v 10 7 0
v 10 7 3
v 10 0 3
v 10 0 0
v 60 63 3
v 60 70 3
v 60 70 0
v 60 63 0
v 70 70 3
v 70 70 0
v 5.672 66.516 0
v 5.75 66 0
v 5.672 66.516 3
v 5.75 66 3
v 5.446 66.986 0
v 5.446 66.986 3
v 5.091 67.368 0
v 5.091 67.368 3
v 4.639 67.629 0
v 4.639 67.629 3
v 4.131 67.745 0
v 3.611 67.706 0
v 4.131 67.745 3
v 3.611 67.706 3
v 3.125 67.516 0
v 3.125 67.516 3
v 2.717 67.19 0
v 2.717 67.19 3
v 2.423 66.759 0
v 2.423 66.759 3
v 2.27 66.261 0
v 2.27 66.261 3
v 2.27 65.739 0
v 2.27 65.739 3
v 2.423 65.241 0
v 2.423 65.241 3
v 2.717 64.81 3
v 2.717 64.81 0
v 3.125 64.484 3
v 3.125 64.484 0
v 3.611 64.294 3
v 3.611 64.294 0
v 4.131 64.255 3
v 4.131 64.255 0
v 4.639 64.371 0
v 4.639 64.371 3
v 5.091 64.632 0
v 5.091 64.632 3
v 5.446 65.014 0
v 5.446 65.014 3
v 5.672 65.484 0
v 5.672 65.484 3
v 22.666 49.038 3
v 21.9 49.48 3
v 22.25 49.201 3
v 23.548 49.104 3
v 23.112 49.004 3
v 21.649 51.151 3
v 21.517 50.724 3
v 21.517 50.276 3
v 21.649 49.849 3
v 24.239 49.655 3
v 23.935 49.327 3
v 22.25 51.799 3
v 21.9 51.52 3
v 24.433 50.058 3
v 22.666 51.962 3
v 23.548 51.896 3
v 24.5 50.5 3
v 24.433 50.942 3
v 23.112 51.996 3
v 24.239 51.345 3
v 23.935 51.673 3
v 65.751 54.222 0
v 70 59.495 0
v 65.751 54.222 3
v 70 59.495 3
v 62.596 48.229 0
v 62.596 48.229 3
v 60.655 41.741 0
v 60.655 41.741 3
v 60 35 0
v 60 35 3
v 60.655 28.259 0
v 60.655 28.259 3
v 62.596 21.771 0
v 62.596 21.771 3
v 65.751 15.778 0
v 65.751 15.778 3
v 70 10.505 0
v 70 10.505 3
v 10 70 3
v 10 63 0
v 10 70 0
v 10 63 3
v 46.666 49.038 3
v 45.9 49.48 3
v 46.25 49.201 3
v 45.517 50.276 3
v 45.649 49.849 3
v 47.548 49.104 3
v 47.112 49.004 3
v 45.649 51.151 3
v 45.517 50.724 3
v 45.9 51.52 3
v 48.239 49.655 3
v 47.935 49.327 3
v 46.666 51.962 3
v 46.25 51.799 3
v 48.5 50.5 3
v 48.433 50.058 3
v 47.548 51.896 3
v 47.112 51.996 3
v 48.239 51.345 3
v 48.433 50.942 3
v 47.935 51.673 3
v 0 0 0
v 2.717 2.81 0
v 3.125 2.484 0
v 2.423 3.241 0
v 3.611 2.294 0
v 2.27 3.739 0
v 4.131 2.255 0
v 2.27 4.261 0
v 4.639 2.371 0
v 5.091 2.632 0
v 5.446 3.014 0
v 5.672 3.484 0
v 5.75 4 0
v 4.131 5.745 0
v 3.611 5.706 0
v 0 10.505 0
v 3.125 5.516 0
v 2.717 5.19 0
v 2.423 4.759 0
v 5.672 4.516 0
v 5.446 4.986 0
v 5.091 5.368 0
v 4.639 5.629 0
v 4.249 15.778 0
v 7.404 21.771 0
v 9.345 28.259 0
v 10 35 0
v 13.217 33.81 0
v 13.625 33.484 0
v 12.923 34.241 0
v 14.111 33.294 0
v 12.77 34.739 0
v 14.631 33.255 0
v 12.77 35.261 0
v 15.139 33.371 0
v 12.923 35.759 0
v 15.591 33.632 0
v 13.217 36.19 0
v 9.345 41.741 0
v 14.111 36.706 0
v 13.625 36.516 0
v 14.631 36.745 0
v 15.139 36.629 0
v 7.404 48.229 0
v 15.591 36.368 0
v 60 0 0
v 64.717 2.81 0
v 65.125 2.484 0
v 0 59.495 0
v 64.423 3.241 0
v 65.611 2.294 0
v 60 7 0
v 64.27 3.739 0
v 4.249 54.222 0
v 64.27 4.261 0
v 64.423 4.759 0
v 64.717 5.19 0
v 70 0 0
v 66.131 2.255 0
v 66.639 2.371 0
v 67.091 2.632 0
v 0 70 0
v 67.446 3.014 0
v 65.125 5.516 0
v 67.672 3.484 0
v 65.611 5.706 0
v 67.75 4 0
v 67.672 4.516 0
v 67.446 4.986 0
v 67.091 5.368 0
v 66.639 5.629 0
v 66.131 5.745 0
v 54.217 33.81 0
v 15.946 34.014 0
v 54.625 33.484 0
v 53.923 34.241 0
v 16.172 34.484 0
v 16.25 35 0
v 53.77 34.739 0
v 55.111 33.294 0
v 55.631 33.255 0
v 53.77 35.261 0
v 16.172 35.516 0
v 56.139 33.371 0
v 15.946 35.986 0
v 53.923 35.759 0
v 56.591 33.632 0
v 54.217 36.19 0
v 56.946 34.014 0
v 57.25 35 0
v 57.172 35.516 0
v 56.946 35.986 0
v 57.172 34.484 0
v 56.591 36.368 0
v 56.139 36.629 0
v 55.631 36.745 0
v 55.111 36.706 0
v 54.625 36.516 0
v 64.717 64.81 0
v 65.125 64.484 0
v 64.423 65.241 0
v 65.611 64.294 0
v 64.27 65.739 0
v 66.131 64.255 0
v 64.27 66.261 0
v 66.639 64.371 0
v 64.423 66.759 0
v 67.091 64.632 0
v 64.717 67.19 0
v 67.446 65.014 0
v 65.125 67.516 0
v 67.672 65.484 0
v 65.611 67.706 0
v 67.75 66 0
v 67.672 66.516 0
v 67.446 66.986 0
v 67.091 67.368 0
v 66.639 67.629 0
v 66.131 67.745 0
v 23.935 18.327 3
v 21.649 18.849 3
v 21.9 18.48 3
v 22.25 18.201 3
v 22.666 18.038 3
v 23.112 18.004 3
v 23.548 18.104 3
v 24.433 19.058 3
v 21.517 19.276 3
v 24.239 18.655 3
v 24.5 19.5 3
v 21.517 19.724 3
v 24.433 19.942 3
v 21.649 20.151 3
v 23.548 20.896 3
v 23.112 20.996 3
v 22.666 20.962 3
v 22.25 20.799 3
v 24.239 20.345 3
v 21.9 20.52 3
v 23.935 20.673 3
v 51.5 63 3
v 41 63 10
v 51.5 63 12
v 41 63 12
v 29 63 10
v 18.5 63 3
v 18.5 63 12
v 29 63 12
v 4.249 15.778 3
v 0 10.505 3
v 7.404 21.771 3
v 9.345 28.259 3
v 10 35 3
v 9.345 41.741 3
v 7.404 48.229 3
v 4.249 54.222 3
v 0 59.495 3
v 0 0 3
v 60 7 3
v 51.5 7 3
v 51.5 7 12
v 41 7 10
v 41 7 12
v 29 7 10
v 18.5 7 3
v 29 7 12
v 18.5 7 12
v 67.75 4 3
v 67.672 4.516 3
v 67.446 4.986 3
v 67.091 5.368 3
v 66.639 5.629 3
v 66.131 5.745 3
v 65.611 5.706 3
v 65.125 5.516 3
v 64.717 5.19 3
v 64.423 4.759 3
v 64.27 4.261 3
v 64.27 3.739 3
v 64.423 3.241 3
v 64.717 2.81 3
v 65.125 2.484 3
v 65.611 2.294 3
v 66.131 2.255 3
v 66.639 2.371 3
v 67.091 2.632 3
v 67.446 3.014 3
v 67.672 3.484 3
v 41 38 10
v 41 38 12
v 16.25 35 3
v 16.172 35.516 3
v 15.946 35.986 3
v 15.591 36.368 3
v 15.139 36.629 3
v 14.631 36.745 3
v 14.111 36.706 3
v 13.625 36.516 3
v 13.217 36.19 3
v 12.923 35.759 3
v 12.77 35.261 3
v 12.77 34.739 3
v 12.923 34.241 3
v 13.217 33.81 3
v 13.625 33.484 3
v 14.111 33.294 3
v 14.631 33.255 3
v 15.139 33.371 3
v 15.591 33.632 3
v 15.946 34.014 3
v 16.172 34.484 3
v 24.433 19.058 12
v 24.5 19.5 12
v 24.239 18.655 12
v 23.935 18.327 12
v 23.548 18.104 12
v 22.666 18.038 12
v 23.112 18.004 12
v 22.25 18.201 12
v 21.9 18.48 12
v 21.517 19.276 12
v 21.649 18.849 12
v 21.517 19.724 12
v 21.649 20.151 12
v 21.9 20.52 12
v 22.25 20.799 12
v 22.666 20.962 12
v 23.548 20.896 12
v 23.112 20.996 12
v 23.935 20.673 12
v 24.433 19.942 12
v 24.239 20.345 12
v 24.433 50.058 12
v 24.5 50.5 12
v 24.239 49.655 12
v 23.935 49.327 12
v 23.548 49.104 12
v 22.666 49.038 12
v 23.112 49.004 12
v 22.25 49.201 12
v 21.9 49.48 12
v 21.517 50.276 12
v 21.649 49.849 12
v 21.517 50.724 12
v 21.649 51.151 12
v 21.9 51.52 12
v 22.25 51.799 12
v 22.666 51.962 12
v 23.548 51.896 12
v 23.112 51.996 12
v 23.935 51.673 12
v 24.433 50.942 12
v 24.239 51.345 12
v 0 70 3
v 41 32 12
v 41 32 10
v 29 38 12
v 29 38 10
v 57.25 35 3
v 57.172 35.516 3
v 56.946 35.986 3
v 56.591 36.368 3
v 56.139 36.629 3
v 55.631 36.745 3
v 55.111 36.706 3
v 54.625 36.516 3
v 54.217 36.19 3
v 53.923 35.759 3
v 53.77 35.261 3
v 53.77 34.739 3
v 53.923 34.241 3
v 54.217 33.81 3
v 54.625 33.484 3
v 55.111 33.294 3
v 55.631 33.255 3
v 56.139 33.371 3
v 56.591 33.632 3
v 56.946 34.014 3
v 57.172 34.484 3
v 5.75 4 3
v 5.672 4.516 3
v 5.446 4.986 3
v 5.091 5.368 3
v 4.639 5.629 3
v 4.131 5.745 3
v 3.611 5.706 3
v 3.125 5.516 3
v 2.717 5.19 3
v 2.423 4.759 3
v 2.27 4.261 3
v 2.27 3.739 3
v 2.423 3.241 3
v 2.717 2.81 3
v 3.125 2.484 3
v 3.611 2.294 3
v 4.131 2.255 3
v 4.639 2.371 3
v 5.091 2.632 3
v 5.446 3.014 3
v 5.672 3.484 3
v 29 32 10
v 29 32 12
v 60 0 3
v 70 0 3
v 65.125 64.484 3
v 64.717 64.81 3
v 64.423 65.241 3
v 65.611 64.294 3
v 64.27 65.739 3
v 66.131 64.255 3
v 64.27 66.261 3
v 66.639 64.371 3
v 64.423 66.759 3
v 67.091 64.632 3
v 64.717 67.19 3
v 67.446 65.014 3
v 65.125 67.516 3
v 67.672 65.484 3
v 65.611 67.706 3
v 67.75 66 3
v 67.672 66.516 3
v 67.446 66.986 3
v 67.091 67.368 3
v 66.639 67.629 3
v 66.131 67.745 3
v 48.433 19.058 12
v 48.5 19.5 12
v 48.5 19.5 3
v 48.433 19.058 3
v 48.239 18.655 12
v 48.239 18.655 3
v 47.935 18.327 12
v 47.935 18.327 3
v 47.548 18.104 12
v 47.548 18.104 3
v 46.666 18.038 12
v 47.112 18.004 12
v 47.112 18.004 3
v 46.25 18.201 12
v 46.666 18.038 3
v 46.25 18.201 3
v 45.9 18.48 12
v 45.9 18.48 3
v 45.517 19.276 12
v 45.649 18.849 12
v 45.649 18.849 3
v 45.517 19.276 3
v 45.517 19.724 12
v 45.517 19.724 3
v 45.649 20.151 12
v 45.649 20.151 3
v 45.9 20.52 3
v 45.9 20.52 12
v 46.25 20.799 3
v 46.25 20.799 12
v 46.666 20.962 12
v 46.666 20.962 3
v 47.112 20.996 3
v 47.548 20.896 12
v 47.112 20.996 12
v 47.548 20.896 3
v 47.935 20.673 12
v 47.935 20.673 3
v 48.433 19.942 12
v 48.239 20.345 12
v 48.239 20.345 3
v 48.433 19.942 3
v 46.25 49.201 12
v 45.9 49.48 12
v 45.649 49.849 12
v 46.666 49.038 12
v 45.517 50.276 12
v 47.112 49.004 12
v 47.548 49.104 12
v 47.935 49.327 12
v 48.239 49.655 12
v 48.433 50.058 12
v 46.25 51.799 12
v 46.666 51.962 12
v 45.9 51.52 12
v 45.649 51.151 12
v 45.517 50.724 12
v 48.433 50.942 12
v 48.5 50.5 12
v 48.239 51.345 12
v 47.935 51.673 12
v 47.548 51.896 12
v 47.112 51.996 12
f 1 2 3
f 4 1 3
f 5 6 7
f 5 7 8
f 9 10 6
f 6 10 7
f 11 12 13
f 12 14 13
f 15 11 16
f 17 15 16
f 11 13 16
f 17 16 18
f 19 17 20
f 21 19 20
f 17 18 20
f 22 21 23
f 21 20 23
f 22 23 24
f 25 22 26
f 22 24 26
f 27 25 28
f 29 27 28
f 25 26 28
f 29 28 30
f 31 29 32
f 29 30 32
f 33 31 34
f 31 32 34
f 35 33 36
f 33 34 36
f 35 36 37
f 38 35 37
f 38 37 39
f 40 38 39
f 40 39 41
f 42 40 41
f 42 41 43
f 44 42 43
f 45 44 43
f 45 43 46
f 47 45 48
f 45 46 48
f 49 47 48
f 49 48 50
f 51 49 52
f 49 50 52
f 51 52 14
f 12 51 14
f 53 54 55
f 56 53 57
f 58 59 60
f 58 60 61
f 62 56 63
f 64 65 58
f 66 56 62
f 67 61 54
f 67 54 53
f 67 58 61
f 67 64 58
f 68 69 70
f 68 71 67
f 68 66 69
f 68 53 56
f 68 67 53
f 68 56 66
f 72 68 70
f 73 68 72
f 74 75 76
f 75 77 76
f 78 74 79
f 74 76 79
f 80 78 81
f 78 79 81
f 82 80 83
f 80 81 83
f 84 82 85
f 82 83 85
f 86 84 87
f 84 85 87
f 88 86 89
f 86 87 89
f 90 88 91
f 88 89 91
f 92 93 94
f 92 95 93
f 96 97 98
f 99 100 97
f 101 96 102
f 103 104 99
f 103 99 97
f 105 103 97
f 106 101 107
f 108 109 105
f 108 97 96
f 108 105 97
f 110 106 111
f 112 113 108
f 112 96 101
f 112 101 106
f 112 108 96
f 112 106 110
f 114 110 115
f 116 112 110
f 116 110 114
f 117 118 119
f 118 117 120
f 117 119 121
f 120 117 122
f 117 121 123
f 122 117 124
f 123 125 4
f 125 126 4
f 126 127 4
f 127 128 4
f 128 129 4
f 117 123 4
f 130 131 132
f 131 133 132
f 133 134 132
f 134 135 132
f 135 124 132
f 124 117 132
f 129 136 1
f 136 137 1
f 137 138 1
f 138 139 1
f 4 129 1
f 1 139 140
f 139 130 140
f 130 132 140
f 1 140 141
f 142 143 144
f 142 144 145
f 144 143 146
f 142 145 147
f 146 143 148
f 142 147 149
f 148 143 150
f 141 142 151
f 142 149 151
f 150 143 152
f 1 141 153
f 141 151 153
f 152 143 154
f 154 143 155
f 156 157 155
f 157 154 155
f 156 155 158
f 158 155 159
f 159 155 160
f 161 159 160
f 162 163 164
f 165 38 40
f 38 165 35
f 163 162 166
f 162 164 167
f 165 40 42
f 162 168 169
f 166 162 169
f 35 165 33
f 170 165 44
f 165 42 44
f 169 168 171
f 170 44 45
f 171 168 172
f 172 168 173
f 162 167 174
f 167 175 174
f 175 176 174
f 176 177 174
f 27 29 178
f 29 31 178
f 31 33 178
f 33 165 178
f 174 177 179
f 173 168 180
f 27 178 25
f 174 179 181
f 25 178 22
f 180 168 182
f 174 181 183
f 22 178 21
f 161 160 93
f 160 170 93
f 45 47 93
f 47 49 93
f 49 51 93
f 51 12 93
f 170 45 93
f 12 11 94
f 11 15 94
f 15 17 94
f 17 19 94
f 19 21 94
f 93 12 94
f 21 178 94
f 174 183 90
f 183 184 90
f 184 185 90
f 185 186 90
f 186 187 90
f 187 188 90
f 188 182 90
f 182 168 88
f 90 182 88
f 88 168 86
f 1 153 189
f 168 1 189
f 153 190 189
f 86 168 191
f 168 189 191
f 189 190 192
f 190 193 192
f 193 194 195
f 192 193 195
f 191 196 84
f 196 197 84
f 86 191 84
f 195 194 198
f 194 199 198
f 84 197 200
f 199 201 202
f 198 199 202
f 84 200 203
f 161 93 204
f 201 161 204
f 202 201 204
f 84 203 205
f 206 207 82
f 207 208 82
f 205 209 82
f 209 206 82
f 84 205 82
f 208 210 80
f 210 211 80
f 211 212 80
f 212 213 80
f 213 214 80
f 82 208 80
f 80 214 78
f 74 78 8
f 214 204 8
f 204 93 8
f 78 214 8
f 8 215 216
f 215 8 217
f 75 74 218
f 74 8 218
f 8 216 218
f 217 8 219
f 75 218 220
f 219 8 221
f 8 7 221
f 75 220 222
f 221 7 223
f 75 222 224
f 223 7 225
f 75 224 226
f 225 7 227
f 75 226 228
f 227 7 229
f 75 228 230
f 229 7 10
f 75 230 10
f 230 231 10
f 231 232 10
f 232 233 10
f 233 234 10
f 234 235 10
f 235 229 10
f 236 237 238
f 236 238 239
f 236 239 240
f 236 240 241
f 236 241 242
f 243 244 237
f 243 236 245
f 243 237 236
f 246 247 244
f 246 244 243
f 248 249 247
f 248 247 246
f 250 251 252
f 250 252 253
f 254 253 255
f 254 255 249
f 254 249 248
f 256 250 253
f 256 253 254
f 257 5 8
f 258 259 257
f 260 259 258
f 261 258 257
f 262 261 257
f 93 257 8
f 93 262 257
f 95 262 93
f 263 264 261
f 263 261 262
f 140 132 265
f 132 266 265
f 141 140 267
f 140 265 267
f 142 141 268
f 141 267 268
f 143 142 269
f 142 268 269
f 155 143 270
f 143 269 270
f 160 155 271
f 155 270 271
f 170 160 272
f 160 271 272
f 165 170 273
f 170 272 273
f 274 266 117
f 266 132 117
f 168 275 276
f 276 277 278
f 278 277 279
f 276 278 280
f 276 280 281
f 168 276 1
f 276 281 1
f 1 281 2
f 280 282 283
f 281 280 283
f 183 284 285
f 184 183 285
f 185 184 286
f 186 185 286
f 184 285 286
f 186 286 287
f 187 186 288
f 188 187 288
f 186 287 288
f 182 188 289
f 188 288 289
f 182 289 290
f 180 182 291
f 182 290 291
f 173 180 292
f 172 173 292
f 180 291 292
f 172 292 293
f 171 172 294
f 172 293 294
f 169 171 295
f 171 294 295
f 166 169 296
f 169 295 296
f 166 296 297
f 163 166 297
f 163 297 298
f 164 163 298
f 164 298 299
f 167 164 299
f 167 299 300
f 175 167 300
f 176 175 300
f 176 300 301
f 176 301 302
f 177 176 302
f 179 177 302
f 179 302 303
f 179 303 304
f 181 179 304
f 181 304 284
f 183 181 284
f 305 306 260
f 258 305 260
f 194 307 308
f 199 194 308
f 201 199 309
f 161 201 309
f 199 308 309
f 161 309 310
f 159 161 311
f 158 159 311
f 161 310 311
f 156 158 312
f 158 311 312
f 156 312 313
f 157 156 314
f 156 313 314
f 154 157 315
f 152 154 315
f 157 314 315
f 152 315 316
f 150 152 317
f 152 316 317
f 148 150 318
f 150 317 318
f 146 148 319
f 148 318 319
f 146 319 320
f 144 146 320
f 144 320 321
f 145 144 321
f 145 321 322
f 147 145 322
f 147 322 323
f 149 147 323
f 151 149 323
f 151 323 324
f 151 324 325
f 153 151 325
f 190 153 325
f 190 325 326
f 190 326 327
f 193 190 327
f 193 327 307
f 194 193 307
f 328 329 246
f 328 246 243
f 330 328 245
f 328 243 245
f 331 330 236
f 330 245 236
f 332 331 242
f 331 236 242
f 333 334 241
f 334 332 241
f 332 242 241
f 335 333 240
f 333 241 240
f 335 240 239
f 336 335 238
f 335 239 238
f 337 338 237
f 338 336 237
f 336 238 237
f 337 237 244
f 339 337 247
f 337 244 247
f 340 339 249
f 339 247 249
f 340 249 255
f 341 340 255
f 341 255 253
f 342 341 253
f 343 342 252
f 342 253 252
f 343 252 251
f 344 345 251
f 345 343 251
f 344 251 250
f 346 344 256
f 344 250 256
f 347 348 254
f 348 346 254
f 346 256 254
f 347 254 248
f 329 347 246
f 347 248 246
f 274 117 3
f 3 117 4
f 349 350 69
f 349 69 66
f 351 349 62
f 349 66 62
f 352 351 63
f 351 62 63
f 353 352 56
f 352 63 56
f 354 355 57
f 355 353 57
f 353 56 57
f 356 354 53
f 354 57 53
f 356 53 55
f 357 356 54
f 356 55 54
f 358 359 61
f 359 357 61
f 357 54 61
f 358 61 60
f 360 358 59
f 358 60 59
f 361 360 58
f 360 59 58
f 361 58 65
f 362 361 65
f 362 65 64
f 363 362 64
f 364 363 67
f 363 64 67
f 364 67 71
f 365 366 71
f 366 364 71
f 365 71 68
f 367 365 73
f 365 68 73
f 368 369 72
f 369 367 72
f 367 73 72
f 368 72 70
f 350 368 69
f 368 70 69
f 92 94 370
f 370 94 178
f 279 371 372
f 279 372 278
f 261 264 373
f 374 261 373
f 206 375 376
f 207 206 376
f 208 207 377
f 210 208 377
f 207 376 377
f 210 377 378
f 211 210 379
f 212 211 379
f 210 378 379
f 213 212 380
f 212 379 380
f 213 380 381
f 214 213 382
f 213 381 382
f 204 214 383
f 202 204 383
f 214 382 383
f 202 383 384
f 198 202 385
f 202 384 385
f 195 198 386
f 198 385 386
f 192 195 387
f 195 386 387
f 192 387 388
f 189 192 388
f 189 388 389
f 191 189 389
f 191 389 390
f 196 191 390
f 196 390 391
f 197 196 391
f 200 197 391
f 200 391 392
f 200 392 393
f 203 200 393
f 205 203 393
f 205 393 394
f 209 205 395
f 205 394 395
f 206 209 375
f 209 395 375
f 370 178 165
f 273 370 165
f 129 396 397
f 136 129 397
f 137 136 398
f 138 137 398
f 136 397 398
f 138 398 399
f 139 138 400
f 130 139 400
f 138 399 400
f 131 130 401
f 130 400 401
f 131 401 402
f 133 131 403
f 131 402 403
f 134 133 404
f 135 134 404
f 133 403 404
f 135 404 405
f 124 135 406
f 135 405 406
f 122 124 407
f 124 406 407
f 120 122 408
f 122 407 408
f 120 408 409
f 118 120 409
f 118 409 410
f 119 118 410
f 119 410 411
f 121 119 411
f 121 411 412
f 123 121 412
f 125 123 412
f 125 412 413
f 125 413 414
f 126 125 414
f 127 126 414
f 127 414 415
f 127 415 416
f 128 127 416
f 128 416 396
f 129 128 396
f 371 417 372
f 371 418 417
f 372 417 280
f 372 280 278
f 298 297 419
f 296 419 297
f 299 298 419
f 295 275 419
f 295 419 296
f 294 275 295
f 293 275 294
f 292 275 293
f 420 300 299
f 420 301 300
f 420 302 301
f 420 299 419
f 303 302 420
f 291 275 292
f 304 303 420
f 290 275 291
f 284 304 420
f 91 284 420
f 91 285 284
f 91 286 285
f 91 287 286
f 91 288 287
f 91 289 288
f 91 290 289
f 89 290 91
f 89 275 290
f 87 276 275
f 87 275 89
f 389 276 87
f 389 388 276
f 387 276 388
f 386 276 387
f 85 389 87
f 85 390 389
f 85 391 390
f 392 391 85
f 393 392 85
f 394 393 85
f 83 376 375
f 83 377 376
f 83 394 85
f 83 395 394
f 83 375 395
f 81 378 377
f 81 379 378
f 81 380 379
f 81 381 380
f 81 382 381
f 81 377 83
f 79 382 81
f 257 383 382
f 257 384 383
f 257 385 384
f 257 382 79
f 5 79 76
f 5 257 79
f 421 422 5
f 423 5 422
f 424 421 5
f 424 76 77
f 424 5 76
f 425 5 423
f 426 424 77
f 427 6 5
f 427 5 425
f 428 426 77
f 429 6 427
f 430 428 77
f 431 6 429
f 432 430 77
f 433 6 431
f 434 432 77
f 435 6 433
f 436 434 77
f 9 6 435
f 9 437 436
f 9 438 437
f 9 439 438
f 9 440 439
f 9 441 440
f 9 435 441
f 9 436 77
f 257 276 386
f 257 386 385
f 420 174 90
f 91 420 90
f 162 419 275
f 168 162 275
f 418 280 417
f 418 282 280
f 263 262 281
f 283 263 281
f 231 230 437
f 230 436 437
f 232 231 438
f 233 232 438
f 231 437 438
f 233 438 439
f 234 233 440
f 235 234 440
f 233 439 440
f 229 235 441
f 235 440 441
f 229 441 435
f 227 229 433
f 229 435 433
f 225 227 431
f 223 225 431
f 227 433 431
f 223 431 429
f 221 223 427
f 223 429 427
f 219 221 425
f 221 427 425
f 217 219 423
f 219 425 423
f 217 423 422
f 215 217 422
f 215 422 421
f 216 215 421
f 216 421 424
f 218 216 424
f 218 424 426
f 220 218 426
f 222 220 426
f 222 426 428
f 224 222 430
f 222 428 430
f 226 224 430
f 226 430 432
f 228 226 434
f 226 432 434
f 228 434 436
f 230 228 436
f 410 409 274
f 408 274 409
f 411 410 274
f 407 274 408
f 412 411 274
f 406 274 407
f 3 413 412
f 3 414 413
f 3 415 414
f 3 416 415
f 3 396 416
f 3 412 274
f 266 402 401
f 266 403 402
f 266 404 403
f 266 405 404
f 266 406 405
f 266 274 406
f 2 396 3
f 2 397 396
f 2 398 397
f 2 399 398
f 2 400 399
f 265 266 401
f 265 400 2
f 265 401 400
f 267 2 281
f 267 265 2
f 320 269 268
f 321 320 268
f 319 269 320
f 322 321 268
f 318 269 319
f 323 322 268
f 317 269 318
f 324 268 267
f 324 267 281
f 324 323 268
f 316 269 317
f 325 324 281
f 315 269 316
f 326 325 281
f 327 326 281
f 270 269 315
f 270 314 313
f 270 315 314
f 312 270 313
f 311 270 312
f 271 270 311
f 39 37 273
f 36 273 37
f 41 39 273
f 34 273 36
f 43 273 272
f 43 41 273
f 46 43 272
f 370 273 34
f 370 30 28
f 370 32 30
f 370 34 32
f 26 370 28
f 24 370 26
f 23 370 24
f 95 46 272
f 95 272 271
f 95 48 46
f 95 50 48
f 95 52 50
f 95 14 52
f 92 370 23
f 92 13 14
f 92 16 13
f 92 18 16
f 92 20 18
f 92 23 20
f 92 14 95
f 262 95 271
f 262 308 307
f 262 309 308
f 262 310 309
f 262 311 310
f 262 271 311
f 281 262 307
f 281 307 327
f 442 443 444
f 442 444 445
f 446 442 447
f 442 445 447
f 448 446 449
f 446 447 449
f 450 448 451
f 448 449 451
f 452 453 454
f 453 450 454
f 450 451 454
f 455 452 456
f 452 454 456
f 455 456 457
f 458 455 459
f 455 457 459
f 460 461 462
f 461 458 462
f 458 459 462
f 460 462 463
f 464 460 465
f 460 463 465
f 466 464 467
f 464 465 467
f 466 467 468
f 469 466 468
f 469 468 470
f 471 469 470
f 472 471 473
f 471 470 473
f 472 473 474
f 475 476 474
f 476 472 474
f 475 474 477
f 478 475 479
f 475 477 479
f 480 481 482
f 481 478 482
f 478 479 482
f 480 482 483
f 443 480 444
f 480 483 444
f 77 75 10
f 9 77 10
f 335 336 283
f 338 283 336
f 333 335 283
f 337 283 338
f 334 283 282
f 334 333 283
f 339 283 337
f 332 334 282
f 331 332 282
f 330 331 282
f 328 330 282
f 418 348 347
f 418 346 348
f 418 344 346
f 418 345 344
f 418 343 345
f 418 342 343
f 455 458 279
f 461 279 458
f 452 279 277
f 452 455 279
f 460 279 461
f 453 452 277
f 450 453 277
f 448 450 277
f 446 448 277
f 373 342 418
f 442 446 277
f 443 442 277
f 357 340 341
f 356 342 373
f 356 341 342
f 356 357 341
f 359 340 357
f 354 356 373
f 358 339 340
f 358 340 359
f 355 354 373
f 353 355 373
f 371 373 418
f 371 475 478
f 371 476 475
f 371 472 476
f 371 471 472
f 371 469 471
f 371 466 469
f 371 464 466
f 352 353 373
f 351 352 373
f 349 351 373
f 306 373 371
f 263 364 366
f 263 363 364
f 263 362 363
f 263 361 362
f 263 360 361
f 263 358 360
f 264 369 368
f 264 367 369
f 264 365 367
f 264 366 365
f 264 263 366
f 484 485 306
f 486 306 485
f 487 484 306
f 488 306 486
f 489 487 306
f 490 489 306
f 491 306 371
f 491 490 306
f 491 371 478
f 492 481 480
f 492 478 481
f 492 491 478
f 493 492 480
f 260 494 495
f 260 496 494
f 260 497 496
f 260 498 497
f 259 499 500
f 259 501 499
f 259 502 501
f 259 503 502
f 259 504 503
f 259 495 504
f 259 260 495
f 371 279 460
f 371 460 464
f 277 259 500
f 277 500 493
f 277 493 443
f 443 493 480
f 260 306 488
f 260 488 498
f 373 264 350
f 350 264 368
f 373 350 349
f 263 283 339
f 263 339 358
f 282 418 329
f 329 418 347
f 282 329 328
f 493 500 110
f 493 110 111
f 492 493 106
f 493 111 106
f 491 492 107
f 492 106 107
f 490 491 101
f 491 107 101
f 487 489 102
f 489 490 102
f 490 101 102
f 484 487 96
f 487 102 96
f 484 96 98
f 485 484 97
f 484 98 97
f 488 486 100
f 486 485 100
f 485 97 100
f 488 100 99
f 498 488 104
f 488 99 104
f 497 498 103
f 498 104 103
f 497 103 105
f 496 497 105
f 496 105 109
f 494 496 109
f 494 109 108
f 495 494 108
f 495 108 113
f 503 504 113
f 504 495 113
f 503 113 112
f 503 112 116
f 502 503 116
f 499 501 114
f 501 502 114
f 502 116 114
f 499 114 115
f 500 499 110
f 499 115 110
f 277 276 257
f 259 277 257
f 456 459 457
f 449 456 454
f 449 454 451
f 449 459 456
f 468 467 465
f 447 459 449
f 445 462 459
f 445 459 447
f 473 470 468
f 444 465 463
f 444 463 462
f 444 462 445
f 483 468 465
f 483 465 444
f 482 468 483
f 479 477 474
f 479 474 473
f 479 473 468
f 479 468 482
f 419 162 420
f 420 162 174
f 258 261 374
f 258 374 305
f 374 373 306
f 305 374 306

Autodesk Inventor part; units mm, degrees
ref_plane "YZ Plane" through (0, 0, 0) normal (1, 0, 0) x (0, 1, 0)
ref_plane "XZ Plane" through (0, 0, 0) normal (0, 1, 0) x (-1, 0, 0)
ref_plane "XY Plane" through (0, 0, 0) normal (0, 0, 1) x (1, 0, 0)
sketch "Sketch1" plane through (0, 0, 0) normal (0, 0, 1) x (1, 0, 0)
  line L0 (0, 0) -> (70, 0)
  line L1 (70, 0) -> (70, 70)
  line L2 (70, 70) -> (0, 70)
  line L3 (0, 70) -> (0, 0)
  dimension "d0" = 70
  dimension "d1" = 70
extrude "Extrusion1" add sketch "Sketch1" along normal blind 3
sketch "Esboço3" plane through (0, 0, 3) normal (0, 0, 1) x (1, 0, 0)
  line L0 (70, 70) -> (0, 70) projected
  line L1 (70, 0) -> (70, 70) projected
  line L2 (0, 70) -> (0, 0) projected
  line L3 (41, 63) -> (29, 63)
  line L4 (29, 63) -> (29, 38)
  line L5 (29, 38) -> (41, 38)
  line L6 (41, 38) -> (41, 63)
  line L7 (41, 7) -> (29, 7)
  line L8 (29, 7) -> (29, 32)
  line L9 (29, 32) -> (41, 32)
  line L10 (41, 32) -> (41, 7)
  line L11 (0, 0) -> (70, 0) projected
  circle A0 centre (23, 19.5) radius 1.5
  circle A1 centre (23, 19.5) radius 4.5
  circle A2 centre (47, 19.5) radius 1.5
  circle A3 centre (47, 19.5) radius 4.5
  circle A4 centre (23, 50.5) radius 4.5
  circle A5 centre (23, 50.5) radius 1.5
  circle A6 centre (47, 50.5) radius 1.5
  circle A7 centre (47, 50.5) radius 4.5
  line L12 (18.5, 7) -> (51.5, 7)
  line L13 (51.5, 7) -> (51.5, 63)
  line L14 (51.5, 63) -> (18.5, 63)
  line L15 (18.5, 63) -> (18.5, 7)
  point P0 (35, 70)
  point P1 (35, 63)
  point P2 (35, 7)
  point P3 (29, 50.5)
  point P4 (35, 32)
  point P5 (18.5, 50.5)
  point P6 (18.5, 19.5)
  point P7 (51.5, 19.5)
  point P8 (51.5, 50.5)
  dimension "d10" = 70
  dimension "d11" = 12
  dimension "d12" = 25
  dimension "d13" = 7
  dimension "d14" = 35
  dimension "d15" = 12
  dimension "d16" = 25
  dimension "d17" = 7
  dimension "d18" = 35
  dimension "d21" = 3
  dimension "d22" = 12.5
  dimension "d24" = 9
  dimension "d25" = 6
  dimension "d26" = 3
  dimension "d27" = 9
  dimension "d28" = 6
  dimension "d29" = 12.5
  dimension "d30" = 9
  dimension "d31" = 6
  dimension "d32" = 3
  dimension "d33" = 12.5
  dimension "d34" = 3
  dimension "d35" = 9
  dimension "d36" = 12.5
  dimension "d37" = 6
  dimension "d40" = 56
  dimension "d41" = 16.5
  dimension "d42" = 16.5
extrude "Extrusão4" add sketch "Esboço3" along normal blind 9 contours L6 L5 L4 L3 | A4 | A1 | A3 | A7 | L14 L13 L12 L10 L9 L8 L15 L4 L5 L6 | L7 L8 L9 L10
sketch "Esboço4" plane through (0, 0, 12) normal (0, 0, 1) x (1, 0, 0)
  line L0 (70, 70) -> (0, 70)
  line L1 (70, 0) -> (70, 70)
  line L2 (0, 70) -> (0, 0)
  line L3 (41, 63) -> (29, 63)
  line L4 (29, 63) -> (29, 38)
  line L5 (29, 38) -> (41, 38)
  line L6 (41, 38) -> (41, 63)
  line L7 (41, 7) -> (29, 7)
  line L8 (29, 7) -> (29, 32)
  line L9 (29, 32) -> (41, 32)
  line L10 (41, 32) -> (41, 7)
  line L11 (0, 0) -> (70, 0)
  circle A0 centre (23, 19.5) radius 1.5
  circle A1 centre (23, 19.5) radius 4.5
  circle A2 centre (47, 19.5) radius 1.5
  circle A3 centre (47, 19.5) radius 4.5
  circle A4 centre (23, 50.5) radius 4.5
  circle A5 centre (23, 50.5) radius 1.5
  circle A6 centre (47, 50.5) radius 1.5
  circle A7 centre (47, 50.5) radius 4.5
  line L12 (18.5, 7) -> (51.5, 7)
  line L13 (51.5, 7) -> (51.5, 63)
  line L14 (51.5, 63) -> (18.5, 63)
  line L15 (18.5, 63) -> (18.5, 7)
  point P0 (35, 70)
  point P1 (35, 63)
  point P2 (35, 7)
  point P3 (29, 50.5)
  point P4 (35, 32)
  point P5 (18.5, 50.5)
  point P6 (18.5, 19.5)
  point P7 (51.5, 19.5)
  point P8 (51.5, 50.5)
  dimension "d43" = 70
  dimension "d44" = 12
  dimension "d45" = 25
  dimension "d46" = 7
  dimension "d47" = 35
  dimension "d48" = 12
  dimension "d49" = 25
  dimension "d50" = 7
  dimension "d51" = 35
  dimension "d52" = 3
  dimension "d53" = 12.5
  dimension "d54" = 9
  dimension "d55" = 6
  dimension "d56" = 3
  dimension "d57" = 9
  dimension "d58" = 6
  dimension "d59" = 12.5
  dimension "d60" = 9
  dimension "d61" = 6
  dimension "d62" = 3
  dimension "d63" = 12.5
  dimension "d64" = 3
  dimension "d65" = 9
  dimension "d66" = 12.5
  dimension "d67" = 6
  dimension "d68" = 56
  dimension "d69" = 16.5
  dimension "d70" = 16.5
extrude "Extrusão5" cut sketch "Esboço4" against normal blind 2 contours L6 L5 L4 L3 | L7 L8 L9 L10
sketch "Esboço5" plane through (0, 0, 3) normal (0, 0, 1) x (1, 0, 0)
  line L0 (0, 0) -> (70, 0) projected
  line L1 (10, 0) -> (60, 0)
  line L2 (60, 0) -> (60, 7)
  line L3 (60, 7) -> (10, 7)
  line L4 (10, 7) -> (10, 0)
  line L5 (70, 70) -> (0, 70) projected
  line L6 (10, 70) -> (60, 70)
  line L7 (60, 70) -> (60, 63)
  line L8 (60, 63) -> (10, 63)
  line L9 (10, 63) -> (10, 70)
  point P0 (35, 0)
  point P1 (60, 3.5)
  point P2 (10, 66.5)
  point P3 (35, 70)
  dimension "d73" = 50
  dimension "d74" = 25
  dimension "d75" = 7
  dimension "d76" = 50
  dimension "d77" = 7
  dimension "d78" = 25
extrude "Extrusão6" cut sketch "Esboço5" against normal up to surface (3 mm away)
sketch "Esboço6" plane through (0, 0, 3) normal (0, 0, 1) x (1, 0, 0)
  circle A0 centre (-25, 35) radius 35
  line L0 (0, 70) -> (0, 0) projected
  line L1 (0, 0) -> (10, 0) projected
  circle A1 centre (95, 35) radius 35
  line L2 (70, 0) -> (70, 70) projected
  line L3 (60, 0) -> (70, 0) projected
  circle A2 centre (4, 66) radius 1.75
  circle A3 centre (66, 66) radius 1.75
  circle A4 centre (4, 4) radius 1.75
  circle A5 centre (66, 4) radius 1.75
  line L4 (10, 70) -> (0, 70) projected
  line L5 (70, 70) -> (60, 70) projected
  circle A6 centre (14.5, 35) radius 1.75
  line L6 (18.5, 63) -> (18.5, 7) projected
  circle A7 centre (55.5, 35) radius 1.75
  line L7 (51.5, 7) -> (51.5, 63) projected
  point P0 (0, 35)
  point P1 (65, 0)
  point P2 (70, 10.5051)
  point P3 (70, 59.4949)
  point P4 (0, 59.4949)
  point P5 (0, 10.5051)
  dimension "d81" = 70
  dimension "d82" = 25
  dimension "d83" = 35
  dimension "d84" = 70
  dimension "d85" = 25
  dimension "d86" = 35
  dimension "d89" = 3.5
  dimension "d90" = 3.5
  dimension "d91" = 3.5
  dimension "d92" = 3.5
  dimension "d93" = 4
  dimension "d94" = 4
  dimension "d95" = 4
  dimension "d96" = 4
  dimension "d97" = 4
  dimension "d98" = 4
  dimension "d99" = 4
  dimension "d100" = 4
  dimension "d101" = 3.5
  dimension "d102" = 4
  dimension "d103" = 35
  dimension "d104" = 3.5
  dimension "d105" = 4
  dimension "d106" = 35
extrude "Extrusão7" cut sketch "Esboço6" against normal up to surface (3 mm away) contours A0 L0 | L2 A1 | A2 | A3 | A4 | A5 | A6 | A7 picked at (1.4165, 28.5928) picked at (66.7381, 33.7107)
sketch "Esboço7" plane through (0, 0, 3) normal (0, 0, 1) x (1, 0, 0)
  point P0 (0, 0)
equation "\"d13\" = d17"
equation "\"d14\" = 0.5 * d10"
equation "\"d18\" = d14"
equation "\"d30\" = d24"
equation "\"d31\" = d25"
equation "\"d32\" = d21"
equation "\"d33\" = d22"
equation "\"d34\" = d21"
equation "\"d35\" = d27"
equation "\"d36\" = d29"
equation "\"d37\" = d28"
equation "\"d46\" = d50"
equation "\"d47\" = 0.5 * d43"
equation "\"d51\" = d47"
equation "\"d60\" = d54"
equation "\"d61\" = d55"
equation "\"d62\" = d52"
equation "\"d63\" = d53"
equation "\"d64\" = d52"
equation "\"d65\" = d57"
equation "\"d66\" = d59"
equation "\"d67\" = d58"
equation "\"d74\" = 0.5 * d73"
equation "\"d78\" = 0.5 * d76"
equation "\"d90\" = d89"
